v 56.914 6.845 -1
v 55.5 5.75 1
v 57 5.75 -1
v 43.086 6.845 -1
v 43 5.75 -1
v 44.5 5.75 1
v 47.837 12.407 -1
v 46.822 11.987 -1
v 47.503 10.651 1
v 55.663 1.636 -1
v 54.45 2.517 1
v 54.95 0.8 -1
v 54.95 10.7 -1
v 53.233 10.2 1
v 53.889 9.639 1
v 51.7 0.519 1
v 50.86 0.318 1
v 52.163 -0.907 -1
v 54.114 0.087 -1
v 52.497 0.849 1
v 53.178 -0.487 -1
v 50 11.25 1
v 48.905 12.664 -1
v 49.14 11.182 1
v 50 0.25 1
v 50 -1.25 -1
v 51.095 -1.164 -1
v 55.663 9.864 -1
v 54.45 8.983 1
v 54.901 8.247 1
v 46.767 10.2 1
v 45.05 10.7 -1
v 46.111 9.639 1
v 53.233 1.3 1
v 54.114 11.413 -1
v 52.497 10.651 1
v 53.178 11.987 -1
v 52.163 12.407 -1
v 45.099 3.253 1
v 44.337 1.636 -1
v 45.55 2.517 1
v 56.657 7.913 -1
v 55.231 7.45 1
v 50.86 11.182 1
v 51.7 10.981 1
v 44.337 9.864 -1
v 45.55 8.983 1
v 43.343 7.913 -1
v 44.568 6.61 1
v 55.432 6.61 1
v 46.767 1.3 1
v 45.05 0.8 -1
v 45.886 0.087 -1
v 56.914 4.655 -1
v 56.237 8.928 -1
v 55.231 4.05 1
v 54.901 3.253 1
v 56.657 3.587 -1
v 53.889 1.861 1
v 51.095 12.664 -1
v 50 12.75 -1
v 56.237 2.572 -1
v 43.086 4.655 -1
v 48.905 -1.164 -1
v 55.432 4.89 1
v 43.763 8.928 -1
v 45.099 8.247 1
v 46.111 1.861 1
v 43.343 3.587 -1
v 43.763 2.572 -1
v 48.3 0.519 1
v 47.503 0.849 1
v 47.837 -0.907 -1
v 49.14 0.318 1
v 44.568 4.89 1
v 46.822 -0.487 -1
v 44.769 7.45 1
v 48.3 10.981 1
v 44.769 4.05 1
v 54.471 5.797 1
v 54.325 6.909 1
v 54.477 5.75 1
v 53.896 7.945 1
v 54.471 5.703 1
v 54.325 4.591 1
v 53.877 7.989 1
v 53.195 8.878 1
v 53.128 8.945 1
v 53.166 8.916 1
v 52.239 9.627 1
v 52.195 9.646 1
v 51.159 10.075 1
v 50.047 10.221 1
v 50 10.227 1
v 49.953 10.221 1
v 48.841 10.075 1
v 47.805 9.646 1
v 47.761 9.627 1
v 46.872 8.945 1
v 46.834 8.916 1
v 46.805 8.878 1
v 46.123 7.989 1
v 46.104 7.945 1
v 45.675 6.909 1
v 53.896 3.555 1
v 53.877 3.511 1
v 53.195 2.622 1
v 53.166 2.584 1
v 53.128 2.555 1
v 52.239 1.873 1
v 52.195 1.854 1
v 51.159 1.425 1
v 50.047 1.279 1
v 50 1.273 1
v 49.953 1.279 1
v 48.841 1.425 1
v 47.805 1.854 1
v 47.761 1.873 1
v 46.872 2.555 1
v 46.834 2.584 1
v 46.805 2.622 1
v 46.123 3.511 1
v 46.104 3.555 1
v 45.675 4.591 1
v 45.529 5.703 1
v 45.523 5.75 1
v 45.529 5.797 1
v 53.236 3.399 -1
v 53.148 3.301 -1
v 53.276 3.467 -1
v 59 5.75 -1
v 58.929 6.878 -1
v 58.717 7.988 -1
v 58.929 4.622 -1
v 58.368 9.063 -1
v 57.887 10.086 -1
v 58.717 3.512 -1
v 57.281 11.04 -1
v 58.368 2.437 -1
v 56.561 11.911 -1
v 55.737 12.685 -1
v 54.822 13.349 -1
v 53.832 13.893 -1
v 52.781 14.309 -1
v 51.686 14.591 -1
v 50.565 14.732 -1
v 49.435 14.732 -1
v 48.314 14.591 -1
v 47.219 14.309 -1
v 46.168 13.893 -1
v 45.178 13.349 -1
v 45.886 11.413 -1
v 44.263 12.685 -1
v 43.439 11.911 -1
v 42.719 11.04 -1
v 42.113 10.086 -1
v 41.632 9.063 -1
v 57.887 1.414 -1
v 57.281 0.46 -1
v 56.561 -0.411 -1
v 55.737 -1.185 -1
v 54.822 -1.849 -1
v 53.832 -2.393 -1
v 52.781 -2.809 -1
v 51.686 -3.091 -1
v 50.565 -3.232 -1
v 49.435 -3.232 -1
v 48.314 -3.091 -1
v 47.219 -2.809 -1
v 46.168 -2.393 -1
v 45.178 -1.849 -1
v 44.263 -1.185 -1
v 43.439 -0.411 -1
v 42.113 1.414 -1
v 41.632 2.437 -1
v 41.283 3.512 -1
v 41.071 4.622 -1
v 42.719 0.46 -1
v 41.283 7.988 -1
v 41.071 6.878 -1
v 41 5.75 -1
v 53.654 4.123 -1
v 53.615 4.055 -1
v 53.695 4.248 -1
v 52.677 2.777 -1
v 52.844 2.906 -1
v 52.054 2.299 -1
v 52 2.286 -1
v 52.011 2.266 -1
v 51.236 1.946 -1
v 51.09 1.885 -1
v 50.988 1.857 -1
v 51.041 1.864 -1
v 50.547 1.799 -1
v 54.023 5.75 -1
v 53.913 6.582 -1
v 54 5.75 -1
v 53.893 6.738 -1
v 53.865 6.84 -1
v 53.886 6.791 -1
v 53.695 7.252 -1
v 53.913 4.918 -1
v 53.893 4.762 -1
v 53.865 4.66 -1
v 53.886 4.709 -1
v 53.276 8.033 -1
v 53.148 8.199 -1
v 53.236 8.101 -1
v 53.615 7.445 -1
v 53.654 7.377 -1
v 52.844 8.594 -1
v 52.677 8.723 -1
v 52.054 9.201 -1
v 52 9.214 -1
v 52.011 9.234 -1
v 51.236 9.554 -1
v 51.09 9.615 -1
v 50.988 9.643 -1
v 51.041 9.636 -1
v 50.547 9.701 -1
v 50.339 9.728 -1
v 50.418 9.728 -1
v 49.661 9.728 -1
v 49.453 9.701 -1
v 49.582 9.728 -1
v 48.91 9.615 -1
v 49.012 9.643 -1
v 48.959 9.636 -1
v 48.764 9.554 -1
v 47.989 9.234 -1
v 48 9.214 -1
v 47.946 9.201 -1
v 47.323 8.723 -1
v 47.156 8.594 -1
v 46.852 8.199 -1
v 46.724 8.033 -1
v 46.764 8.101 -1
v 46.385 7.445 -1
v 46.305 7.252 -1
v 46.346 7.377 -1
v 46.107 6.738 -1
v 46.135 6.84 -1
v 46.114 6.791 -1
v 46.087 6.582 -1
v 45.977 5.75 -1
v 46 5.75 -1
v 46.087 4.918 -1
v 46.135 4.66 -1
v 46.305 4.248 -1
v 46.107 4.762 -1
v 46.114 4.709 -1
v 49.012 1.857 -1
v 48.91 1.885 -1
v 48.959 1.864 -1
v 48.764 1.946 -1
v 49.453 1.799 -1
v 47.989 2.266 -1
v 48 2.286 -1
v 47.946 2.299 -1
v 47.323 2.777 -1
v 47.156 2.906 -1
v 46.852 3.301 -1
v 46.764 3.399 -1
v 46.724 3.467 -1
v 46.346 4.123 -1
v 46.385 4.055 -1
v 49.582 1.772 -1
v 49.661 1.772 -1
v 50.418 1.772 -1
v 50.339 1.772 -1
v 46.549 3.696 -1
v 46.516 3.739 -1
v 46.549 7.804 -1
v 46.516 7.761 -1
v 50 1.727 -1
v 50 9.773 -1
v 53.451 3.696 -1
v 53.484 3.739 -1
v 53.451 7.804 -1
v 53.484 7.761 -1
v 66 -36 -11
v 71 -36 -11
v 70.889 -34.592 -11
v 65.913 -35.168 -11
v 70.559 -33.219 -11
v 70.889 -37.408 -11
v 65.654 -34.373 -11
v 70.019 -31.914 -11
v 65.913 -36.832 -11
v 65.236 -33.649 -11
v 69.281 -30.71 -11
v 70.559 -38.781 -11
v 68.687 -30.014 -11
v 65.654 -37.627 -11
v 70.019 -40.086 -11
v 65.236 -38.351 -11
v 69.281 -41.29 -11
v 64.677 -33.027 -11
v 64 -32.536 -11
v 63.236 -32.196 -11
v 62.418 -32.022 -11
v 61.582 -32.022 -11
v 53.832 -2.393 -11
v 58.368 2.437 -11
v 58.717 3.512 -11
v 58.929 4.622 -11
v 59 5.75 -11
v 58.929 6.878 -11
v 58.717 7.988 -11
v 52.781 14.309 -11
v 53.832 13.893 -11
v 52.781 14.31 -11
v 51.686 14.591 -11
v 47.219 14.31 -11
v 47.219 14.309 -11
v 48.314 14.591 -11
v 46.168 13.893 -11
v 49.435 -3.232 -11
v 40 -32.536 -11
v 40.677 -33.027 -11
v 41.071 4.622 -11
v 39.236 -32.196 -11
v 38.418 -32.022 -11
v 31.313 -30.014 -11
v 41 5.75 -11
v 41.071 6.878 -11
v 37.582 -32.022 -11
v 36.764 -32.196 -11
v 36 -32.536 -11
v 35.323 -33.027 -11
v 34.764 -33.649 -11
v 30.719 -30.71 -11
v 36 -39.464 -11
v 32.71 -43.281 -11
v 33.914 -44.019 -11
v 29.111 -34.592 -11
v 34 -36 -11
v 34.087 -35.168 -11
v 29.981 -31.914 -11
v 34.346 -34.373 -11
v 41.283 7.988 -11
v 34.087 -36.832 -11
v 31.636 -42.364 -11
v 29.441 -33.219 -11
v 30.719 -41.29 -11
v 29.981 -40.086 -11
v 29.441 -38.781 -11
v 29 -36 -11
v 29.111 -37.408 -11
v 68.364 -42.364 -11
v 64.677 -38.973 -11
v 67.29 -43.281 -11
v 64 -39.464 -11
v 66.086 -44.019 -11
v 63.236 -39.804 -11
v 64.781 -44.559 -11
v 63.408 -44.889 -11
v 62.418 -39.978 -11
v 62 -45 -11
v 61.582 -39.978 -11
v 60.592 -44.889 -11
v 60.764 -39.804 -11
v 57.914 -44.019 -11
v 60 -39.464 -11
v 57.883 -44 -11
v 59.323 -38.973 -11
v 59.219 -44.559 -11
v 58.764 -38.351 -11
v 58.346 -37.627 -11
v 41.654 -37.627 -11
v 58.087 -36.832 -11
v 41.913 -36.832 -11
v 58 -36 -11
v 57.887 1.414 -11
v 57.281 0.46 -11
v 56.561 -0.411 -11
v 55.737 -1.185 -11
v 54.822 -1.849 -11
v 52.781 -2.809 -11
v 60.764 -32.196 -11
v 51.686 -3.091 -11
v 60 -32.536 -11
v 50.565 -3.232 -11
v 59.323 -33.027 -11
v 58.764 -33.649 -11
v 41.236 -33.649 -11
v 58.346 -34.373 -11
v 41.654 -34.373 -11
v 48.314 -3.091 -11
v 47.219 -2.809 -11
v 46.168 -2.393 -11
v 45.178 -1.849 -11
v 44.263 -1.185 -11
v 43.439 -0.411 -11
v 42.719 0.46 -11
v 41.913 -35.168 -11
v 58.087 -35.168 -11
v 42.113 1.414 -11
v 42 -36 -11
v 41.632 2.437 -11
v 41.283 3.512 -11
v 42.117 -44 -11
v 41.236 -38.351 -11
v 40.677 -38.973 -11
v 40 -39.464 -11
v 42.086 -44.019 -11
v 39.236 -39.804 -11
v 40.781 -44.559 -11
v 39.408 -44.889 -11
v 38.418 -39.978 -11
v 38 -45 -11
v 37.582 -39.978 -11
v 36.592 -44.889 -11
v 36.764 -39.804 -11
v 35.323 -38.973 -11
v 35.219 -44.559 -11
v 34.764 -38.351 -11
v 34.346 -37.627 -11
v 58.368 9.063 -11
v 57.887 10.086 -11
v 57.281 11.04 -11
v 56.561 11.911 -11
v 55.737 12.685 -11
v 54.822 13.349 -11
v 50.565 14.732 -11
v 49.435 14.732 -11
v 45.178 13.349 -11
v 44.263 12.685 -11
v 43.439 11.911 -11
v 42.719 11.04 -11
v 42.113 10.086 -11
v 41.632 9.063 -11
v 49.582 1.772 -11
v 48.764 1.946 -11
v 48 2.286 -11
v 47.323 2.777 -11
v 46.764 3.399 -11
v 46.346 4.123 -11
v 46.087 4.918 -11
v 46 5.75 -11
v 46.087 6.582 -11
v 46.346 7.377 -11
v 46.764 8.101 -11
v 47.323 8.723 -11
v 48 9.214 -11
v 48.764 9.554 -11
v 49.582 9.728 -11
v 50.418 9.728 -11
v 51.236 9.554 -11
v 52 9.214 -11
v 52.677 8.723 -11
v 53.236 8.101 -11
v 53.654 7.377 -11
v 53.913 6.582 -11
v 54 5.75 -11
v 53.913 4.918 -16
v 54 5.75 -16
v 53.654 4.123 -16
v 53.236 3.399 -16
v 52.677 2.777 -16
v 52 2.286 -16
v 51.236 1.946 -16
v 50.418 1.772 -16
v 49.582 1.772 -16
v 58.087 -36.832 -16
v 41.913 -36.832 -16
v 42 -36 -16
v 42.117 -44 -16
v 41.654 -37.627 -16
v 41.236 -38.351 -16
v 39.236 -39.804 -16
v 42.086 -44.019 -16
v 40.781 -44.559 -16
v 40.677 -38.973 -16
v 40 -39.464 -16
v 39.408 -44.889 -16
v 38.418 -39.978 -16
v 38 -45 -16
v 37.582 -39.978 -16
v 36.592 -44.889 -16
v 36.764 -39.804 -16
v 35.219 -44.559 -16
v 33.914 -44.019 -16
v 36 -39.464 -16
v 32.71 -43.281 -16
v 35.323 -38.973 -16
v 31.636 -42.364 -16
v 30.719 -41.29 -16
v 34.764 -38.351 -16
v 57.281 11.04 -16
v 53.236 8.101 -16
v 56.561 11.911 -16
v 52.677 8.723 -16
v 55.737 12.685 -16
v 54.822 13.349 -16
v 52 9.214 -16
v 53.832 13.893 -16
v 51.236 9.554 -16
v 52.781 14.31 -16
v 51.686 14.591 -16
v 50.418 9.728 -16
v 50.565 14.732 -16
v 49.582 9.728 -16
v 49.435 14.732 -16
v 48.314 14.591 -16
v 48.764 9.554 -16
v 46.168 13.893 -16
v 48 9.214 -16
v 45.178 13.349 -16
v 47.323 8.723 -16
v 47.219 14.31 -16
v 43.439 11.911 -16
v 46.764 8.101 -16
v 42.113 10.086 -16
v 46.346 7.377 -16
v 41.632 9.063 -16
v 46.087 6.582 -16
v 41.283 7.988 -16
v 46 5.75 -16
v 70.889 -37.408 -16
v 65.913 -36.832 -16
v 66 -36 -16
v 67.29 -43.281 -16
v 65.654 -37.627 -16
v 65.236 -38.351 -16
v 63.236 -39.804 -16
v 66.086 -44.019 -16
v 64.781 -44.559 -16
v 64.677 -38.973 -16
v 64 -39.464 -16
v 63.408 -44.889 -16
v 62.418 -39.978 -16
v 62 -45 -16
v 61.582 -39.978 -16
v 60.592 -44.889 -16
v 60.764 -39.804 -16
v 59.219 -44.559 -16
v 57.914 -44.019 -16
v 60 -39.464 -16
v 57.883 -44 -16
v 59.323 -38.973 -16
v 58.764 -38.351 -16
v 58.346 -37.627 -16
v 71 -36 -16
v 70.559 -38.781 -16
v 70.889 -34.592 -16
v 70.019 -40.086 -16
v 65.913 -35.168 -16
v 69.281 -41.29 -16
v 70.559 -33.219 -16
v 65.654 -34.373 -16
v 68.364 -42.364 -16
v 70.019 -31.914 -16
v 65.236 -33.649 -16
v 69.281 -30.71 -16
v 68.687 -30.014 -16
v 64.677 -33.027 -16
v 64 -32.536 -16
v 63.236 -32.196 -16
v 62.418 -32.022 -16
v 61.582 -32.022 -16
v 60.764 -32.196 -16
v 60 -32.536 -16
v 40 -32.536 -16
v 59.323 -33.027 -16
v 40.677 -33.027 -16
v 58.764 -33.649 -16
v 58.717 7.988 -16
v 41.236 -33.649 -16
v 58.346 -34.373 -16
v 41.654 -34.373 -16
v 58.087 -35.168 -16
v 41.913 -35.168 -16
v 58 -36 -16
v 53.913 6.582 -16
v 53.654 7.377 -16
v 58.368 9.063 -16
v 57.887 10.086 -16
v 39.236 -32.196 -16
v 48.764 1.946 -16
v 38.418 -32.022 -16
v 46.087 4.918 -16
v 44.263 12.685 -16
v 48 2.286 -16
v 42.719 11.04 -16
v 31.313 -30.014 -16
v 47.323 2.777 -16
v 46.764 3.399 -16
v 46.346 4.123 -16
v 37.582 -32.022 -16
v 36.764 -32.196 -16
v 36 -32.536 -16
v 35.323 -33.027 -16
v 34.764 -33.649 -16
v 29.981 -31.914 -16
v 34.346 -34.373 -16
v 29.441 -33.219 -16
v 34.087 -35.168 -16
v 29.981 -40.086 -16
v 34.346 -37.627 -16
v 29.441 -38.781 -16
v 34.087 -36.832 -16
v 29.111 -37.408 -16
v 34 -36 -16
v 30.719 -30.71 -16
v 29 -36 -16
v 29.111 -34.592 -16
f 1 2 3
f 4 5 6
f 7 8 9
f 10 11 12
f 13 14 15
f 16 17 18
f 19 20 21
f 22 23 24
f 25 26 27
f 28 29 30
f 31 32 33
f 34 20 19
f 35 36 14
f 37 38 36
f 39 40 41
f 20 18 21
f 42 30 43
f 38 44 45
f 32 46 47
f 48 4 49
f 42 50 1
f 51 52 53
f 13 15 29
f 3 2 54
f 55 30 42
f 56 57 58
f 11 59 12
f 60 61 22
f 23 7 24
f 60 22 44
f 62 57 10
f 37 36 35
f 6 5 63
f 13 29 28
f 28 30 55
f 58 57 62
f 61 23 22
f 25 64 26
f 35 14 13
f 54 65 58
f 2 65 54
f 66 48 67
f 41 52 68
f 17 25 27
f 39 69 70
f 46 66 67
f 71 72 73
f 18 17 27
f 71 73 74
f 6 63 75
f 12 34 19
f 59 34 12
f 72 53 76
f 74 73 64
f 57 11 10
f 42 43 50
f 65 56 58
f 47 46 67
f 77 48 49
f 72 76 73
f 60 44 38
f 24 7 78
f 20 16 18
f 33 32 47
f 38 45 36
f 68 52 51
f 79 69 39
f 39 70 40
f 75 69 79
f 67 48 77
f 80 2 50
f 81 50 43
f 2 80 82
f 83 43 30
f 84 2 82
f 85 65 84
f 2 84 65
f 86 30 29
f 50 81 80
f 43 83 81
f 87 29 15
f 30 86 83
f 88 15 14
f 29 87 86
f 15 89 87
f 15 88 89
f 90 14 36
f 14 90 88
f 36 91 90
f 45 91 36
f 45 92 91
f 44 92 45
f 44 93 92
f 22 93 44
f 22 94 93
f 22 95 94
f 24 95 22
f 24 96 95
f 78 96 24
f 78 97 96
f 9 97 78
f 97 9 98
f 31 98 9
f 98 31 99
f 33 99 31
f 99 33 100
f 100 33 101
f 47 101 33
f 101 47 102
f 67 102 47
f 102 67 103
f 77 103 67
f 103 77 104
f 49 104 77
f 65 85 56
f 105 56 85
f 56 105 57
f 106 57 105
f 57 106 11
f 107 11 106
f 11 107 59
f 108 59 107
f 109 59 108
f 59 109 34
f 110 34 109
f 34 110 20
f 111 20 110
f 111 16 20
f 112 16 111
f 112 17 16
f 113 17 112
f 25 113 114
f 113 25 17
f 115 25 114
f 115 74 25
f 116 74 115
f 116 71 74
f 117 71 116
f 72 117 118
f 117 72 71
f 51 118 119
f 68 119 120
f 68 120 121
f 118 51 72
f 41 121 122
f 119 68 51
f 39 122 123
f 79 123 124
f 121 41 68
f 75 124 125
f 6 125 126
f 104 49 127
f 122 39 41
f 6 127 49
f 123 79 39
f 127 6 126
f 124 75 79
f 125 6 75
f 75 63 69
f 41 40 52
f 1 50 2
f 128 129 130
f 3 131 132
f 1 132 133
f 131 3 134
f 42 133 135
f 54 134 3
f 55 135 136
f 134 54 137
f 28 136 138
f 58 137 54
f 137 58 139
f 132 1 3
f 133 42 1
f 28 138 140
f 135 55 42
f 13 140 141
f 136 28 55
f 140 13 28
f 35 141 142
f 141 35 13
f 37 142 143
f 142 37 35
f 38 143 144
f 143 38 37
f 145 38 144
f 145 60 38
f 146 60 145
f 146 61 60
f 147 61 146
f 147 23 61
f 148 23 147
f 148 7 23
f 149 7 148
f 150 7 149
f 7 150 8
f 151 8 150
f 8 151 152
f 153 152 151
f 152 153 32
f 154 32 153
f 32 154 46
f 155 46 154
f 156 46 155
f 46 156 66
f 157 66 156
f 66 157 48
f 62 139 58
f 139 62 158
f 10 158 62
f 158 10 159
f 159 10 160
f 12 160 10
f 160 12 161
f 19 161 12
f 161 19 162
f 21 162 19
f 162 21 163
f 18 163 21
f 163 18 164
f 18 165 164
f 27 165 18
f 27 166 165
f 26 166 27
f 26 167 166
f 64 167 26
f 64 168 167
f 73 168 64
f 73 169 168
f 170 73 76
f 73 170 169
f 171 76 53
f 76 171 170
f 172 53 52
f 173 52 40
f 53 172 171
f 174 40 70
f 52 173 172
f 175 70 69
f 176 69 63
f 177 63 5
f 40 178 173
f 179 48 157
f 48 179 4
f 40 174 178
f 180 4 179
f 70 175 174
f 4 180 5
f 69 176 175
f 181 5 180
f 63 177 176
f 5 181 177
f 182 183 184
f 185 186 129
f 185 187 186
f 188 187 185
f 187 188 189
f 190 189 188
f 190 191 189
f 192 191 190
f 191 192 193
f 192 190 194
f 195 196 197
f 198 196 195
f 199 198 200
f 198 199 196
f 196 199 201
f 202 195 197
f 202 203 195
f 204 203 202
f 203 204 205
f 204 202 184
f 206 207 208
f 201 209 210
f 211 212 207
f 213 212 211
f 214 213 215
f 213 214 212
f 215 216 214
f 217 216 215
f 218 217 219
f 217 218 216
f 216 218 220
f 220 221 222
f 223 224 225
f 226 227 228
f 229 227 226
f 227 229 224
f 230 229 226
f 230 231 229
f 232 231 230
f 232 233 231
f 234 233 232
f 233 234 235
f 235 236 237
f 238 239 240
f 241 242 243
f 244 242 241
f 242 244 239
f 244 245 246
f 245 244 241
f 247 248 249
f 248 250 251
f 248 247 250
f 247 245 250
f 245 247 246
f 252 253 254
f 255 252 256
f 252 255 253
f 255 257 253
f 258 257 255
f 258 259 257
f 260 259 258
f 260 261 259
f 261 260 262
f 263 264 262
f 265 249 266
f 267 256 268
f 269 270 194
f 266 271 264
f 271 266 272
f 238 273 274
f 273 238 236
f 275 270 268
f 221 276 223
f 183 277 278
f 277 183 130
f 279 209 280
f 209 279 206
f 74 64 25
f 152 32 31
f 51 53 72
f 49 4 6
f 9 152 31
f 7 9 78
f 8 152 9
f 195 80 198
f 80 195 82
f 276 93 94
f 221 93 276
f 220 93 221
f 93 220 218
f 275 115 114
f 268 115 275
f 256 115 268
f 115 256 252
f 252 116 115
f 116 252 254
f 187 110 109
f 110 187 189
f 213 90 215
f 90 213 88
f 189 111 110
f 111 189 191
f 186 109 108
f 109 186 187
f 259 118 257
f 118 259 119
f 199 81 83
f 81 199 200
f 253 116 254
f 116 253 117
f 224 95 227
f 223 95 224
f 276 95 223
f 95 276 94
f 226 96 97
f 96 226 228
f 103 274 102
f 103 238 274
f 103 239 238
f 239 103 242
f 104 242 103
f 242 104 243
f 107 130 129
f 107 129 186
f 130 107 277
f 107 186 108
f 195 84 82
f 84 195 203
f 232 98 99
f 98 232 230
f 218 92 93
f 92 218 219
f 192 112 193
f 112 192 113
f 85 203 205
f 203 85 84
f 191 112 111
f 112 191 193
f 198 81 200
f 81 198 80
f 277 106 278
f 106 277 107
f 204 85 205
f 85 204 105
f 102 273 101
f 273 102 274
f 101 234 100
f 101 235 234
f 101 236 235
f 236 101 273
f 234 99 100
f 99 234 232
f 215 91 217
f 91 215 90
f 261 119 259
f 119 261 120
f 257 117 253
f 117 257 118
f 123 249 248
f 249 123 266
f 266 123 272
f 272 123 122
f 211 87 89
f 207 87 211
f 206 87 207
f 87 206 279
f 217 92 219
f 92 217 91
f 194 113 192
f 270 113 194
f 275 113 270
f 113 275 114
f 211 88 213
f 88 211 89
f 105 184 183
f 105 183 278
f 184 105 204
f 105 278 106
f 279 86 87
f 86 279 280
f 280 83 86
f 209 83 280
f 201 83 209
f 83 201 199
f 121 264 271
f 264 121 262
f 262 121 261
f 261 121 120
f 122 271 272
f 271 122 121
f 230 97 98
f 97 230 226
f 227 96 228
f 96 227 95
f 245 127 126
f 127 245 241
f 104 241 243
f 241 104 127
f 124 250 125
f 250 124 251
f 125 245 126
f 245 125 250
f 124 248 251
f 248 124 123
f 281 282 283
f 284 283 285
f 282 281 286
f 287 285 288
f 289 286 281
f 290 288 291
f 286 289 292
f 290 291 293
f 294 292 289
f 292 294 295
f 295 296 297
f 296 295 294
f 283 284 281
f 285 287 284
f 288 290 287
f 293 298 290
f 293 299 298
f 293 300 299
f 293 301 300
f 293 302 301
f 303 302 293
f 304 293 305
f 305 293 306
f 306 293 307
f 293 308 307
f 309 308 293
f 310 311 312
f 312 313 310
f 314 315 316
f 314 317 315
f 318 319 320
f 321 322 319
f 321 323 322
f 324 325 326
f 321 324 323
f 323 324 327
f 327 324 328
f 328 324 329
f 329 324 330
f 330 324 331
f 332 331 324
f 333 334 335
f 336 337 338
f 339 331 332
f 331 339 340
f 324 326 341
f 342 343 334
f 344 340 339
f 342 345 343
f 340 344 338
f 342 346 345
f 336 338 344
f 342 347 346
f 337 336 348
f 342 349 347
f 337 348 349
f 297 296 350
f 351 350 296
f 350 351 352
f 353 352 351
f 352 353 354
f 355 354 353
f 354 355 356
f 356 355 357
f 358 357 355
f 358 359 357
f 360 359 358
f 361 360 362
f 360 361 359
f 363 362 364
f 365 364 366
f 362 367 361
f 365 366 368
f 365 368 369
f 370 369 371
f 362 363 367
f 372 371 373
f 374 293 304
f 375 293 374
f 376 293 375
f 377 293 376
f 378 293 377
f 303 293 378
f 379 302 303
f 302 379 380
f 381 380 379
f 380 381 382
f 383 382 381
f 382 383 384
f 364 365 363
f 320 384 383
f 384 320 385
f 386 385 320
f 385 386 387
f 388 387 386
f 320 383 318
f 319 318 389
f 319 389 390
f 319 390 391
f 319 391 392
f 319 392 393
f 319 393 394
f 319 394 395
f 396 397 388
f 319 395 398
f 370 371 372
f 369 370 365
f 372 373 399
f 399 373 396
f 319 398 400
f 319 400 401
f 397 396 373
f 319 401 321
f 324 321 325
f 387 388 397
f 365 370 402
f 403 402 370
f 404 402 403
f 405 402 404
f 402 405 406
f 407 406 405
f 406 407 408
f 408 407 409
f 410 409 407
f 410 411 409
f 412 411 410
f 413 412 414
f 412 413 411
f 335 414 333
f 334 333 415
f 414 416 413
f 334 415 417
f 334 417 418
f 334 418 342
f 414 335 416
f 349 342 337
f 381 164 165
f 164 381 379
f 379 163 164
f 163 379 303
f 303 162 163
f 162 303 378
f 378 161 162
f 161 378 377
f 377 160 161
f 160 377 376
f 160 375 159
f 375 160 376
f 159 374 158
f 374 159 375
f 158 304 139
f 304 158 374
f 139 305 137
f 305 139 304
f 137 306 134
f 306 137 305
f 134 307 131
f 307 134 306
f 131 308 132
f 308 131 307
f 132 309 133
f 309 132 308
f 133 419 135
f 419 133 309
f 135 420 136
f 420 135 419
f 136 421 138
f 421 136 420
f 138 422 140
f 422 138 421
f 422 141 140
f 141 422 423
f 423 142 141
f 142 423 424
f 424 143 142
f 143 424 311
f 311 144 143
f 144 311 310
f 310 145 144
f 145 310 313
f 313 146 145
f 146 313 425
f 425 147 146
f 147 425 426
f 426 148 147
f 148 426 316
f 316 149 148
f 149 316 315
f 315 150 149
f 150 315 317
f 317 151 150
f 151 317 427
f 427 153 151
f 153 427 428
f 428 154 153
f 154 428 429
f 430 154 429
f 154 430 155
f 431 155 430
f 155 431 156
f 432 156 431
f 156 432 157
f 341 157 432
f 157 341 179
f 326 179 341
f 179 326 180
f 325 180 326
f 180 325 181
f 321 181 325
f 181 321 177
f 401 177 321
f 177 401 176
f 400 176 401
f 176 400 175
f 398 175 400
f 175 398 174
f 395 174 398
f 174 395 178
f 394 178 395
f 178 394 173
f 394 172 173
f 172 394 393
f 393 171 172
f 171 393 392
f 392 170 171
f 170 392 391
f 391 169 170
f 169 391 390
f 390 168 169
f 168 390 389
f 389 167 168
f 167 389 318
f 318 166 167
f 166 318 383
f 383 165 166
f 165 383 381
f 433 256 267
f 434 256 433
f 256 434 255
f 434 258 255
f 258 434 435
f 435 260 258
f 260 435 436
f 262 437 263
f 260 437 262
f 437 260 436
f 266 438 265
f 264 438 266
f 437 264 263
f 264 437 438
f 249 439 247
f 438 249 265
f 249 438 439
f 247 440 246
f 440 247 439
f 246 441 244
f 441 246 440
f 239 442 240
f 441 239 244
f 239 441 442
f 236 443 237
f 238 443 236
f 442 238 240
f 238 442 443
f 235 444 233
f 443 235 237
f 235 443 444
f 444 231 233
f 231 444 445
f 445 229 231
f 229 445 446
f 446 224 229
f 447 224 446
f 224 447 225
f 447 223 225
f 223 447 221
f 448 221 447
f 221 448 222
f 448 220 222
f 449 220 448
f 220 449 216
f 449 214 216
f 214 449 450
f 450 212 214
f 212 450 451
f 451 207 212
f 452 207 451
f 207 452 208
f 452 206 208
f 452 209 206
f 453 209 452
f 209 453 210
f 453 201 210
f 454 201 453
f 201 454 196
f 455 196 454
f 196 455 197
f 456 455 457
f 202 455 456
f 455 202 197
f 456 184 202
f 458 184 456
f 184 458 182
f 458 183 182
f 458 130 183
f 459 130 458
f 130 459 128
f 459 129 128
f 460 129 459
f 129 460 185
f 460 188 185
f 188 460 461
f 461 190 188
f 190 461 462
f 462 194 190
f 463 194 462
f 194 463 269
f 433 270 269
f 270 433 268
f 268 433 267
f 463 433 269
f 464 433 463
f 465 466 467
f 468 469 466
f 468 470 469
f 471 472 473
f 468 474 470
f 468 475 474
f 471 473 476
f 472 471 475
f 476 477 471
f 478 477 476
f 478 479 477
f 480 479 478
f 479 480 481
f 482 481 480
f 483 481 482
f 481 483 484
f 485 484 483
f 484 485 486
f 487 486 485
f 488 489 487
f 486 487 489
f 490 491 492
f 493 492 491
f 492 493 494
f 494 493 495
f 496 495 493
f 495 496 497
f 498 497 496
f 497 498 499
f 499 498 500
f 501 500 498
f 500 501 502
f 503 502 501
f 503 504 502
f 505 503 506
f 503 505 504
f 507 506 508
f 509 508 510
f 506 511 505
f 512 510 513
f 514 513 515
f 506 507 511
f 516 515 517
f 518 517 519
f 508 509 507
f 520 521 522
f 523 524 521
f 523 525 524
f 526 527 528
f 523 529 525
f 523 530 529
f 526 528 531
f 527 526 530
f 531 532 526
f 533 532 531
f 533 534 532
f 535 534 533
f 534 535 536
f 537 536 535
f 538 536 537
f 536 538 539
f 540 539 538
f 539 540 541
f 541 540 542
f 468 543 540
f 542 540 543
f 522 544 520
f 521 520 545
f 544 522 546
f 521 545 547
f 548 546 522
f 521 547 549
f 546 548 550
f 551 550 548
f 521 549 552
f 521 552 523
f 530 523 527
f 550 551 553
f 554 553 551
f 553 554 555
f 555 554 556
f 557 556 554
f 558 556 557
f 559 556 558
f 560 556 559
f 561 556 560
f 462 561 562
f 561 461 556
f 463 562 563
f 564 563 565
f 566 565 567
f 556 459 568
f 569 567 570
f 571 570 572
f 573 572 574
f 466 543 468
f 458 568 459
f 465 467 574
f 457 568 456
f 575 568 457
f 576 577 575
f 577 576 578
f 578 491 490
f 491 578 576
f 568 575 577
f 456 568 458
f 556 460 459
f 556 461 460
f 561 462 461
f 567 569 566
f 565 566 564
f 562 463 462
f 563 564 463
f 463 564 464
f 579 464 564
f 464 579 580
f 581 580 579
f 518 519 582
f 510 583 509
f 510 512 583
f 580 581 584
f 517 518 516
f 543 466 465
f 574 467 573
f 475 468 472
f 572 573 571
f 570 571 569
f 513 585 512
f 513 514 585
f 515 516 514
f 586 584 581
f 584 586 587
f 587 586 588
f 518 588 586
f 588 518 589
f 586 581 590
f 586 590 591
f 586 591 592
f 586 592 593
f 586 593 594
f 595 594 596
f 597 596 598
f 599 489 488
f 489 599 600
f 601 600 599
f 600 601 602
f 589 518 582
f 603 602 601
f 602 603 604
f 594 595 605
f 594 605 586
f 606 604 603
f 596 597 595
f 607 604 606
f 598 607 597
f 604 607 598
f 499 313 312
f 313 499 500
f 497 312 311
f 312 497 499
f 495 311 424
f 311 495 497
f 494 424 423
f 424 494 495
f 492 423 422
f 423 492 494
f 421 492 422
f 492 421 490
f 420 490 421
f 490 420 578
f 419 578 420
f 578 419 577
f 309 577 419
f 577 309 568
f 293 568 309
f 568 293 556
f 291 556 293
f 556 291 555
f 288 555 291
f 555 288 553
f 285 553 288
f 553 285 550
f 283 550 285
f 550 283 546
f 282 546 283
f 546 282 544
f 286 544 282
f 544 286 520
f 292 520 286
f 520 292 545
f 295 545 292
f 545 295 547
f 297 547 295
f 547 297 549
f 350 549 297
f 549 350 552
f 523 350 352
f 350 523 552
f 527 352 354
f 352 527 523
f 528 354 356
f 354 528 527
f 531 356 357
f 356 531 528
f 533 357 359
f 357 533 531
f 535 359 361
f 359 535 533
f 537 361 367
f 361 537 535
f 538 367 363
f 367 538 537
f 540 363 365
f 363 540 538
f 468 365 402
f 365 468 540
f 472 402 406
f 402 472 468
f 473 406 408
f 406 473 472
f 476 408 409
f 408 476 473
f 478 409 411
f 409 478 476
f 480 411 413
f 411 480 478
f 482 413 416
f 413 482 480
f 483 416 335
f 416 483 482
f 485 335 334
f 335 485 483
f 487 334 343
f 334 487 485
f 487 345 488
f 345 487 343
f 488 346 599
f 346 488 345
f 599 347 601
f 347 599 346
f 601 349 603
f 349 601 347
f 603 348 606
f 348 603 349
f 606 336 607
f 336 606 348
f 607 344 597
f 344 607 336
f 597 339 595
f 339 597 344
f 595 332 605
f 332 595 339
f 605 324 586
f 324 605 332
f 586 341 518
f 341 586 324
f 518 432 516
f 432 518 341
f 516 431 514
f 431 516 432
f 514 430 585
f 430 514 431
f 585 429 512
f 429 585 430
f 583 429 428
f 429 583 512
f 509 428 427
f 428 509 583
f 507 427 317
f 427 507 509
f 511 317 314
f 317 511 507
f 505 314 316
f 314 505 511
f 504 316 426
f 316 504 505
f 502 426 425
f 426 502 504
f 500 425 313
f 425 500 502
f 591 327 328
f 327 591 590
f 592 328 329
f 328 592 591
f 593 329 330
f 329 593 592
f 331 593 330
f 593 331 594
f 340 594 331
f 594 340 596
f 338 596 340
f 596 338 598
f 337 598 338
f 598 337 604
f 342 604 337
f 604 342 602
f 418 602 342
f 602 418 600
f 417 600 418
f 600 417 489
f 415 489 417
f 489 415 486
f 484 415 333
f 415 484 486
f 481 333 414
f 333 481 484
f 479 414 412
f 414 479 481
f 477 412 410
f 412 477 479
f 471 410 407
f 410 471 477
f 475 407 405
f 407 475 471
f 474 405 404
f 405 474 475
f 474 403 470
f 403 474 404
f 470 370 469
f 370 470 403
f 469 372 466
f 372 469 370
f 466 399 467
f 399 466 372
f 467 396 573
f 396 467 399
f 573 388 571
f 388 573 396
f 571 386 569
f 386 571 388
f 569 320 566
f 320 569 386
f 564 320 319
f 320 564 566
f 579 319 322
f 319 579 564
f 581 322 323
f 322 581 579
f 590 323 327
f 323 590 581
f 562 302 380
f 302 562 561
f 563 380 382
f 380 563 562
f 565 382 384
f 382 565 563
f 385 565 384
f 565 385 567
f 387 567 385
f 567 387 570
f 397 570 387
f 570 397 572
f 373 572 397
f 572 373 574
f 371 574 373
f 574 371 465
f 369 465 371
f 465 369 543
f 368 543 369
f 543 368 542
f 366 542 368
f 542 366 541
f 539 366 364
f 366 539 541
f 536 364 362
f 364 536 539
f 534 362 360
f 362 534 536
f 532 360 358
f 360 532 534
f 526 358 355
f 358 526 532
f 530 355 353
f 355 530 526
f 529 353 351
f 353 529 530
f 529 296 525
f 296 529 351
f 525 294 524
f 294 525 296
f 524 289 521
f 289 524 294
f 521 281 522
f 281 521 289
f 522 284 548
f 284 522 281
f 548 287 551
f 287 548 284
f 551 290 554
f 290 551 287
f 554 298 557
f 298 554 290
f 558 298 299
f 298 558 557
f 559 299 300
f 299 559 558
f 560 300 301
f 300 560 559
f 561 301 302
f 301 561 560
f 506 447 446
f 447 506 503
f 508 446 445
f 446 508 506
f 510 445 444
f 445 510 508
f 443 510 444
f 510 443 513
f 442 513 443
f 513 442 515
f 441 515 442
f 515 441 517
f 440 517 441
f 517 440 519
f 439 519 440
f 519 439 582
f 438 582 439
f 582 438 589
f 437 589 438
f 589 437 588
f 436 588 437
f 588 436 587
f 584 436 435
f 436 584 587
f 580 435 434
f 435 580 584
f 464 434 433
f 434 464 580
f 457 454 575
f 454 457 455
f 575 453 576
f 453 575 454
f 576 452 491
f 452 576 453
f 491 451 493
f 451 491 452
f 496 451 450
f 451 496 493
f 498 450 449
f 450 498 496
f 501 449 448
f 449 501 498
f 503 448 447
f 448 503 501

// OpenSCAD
//*/
tubesize=20;//25.4;
wide=80;
thick=31;
zoff=8;
c2o=0;
comp=.25;
half=0;
deep=40+tubesize;
translate([-45,20,-tubesize]) tube(2);
translate([-45,40,0]) rotate([0,0,-90]) {
  tube(2);
  translate([130,0]) {
    translate([0,0,-5]) carrier_block(0,1);
    translate([70-tubesize/2,-10,24+tubesize+2]) rotate([0,0,90]) {
      translate([55,-5,20]) {
        rotate([-90,0]) union() {
          carrier_block(0,1);
          rotate([-90,0]) counter();

        }
        
      }
      tube(2);
    }
  }
}
translate([80-10,20,-tubesize-5]) carrier_block(0,1);
translate([120-tubesize/2,50,24]) rotate([0,0,-90]) {
  translate([70,22,0]) {
        rotate([90,0]) carrier_block(0,1);
      }
  tube(2);
}
translate([80-10,20,6]) mirror([0,0,1]) carrier_block(0);
*for(x=[10,60],y=[9,56.4]) translate([x,y,-52]) bolt(3.5);
//*/
//*

module counter() {
  !rotate([90,0]) union() {
    difference() {
      translate([32,-16,-16]) rotate([-90,0]) mirror([0,1]) 
        linear_extrude(5,convexity=3) difference() { union() {
          translate([6,52]) circle(d=18,$fn=40);
          translate([30,52]) circle(d=18,$fn=40);
          hull() {
            //square([36,64]);
            translate([6,52]) circle(d=16,$fn=40);
            translate([30,52]) circle(d=16,$fn=40);
            translate([18,10+comp]) circle(d=18,$fn=50);
          }
        }
      translate([6,52]) circle(d=8,h=10,$fn=30);
      translate([30,52]) circle(d=8,h=10,$fn=30);
      translate([18,10+comp]) circle(d=8,h=10,$fn=30);
      }
    }
    translate([50,-16+5,-6+comp]) rotate([-90,0]) {
      linear_extrude(10) difference() {
        circle(d=18,$fn=50);
        circle(d=8,$fn=30);
      }
      translate([0,0,10]) hump();
      %translate([0,0,12]) bearing();
    }
   }
}
module mpcpc_style() {
xpos=245;
ypos=80;
yfeet=3;
xfeet=4;
zup=100;
{
  translate([0,0,zup-48]) tube(xfeet);
  translate([25.4,0,-25.4]) rotate([0,0,90]) tube(yfeet);
  for(x=[xpos]) {
    translate([x,-20,zup]) rotate([0,0,90]) tube(yfeet);
    translate([x-45,0,zup-48]) carrier_block();
  }
  for(y=[ypos]) {
    translate([-20,y,22.6]) {
      tube(xfeet);
      translate([45.4,-20,-47.6]) rotate([0,0,90]) carrier_block();
    }
  }
  
}
}
module cube2(dims,r=7,o=2)
{
  linear_extrude(dims[2],convexity=4) {
    translate([r-o,r-o]) square([dims[0]-r*2+o*2,dims[1]-r*2+o*2]);
    for(x=[r,dims[0]-r],y=[r,dims[1]-r])
      translate([x,y]) rotate([0,0,x>r?(y>r?180:90):(y>r?270:0)]) 
        difference() { hull() {
          circle(r=r,$fn=50);
          translate([10,10]) circle(r=r,$fn=50);
          }
        }
  }
}

module carrier_block(bolts=1,bearings=1) {
  hxpos=wide>45?[wide/2-12,wide/2+12]:[10,wide-10];
  hypos=[-1,tubesize-9]; //[0,15.4];
  vxpos=wide>=60?[10,wide-10]:[wide/2];
  vypos=[-20+comp,2+tubesize-comp];
  *echo(str("diff: ", vypos[1]-vypos[0]));
  intersection() {
    union() {
      translate([10,0]) {
      difference() {
        translate([0,-20,18+zoff]) {
          translate([3,2+comp]) cube2([wide-6,deep-4-comp*2,thick-zoff],o=c2o);
        }
        translate([-.1,-2,17.9]) cube([wide+.2,4+tubesize,10]);
          for(x=hxpos,y=hypos) translate([x,y,35]) {
            rotate([-90,0]) linear_extrude(10) {
              circle(d=25,h=10,$fn=50);
              translate([-12.5,-15]) square([25,30]);
            }
            *translate([-12.5,0,-10]) cube([25,10,10]);
        }
        for(y=vypos,x=vxpos) translate([0,y,18])
          translate([x,9,-.1]) cylinder(d=8,h=thick+.2,$fn=24);
        for(x=hxpos) translate([x,-20.1,36]) rotate([-90,0]) {
          cylinder(d=8,h=66.02,$fn=24);
          cylinder(d=19,h=9.09-c2o+comp,$fn=50);
          translate([0,0,51.11+c2o-comp]) cylinder(d=19,h=8,$fn=50);
        }
        translate([wide/2,deep/2-20]) for(m=[0,1]) mirror([0,m]) translate([0,tubesize/2+6]) cylinder(d=3,h=50,$fn=20);
      }
      for(y=hypos) translate([0,y-7]) mirrory(12) for(x=hxpos) translate([x,7,36]) rotate([-90,0]) hump(1.4);
      for(y=vypos,x=vxpos) translate([x,y+9,18+zoff]) mirror([0,0,1]) hump(2);
    %translate([0,9]) for(y=vypos,x=vxpos) translate([x,y,17]) {
      if(bearings) bearing();
      if(bolts) translate([0,0,0]) bolt(2);
    }
      if(bearings)
      %for(x=hxpos,y=hypos) translate([x,y+1.4,36.4]) rotate([-90,0]) bearing();
      if(bolts)
      %for(x=hxpos) translate([x,-20,36.4]) rotate([-90,0]) bolt(2.75);
    }
  }
  if(half) {
    translate([10,tubesize/2,22]) cube([wide,deep/2,thick]);
  }
}
}
/*
//*/
module bolt(inches)
{
  cylinder(d=25.4*(5/16),h=inches*25.4,$fn=36);
  translate([0,0,-5]) cylinder(d=13,h=5,$fn=6);
}
module tube(feet=1)
{
  color(tubesize==25.4?"black":"silver") 
    if(tubesize==20)
    {
      translate([0,tubesize/2,tubesize/2]) rotate([0,90]) linear_extrude(feet*12*25.4) ex_face(tubesize,5);
    } else {
      difference() {
      cube([feet*12*25.4,tubesize,tubesize]);
      if(tubesize==25.4) translate([-.1,2,2]) cube([feet*12*25.4+.2,21.4,21.4]);
      }
  }
}
module hump(h=2) {
  difference() {
    cylinder(d1=14,d2=11,h=h,$fn=40);
    translate([0,0,-.1]) cylinder(d1=8,d2=9,h=h+.2,$fn=24);
  }
}
module bearing() {
linear_extrude(7) difference() {
  circle(d=22,h=7,$fn=40);
  circle(d=8,$fn=24);
}
}
module mirrorz(offset=0)
{
  translate([0,0,offset]) for(m=[0,1]) mirror([0,0,m]) translate([0,0,offset*-1]) children();
}
module mirrory(offset=0)
{
  translate([0,offset,0]) for(m=[0,1]) mirror([0,m,0]) translate([0,offset*-1,0]) children();
}
module mirrorx(offset=0)
{
  translate([offset,0]) for(m=[0,1]) mirror([m,0]) translate([offset*-1,0]) children();
}

module ex_face(size=30,type=6,r=2,sides=4)
{
  hole1s=(type==6?6.8:(type==5?4.2:(type==8?10.5:type)));
  hole2s=(type==6?3:type==8?6:5);
  difference(){
    translate([size*-.5+r,size*-.5+r]) minkowski(){
      square(size-r*2);
      circle(r=r,$fn=20);
    }
    if(type>5) for(r=[0:90:359]) rotate([0,0,r]) translate([size*.5-hole2s/2-2,size*.5-hole2s/2-2]) circle(d=hole2s,$fn=30);
    circle(d=hole1s,$fn=30);
    for(rot=sides==4?[]:(sides==3?[0]:(sides==2?[0,2]:[0]))) rotate([0,0,rot*90]) {
      if(type==8)
        translate([-15,-18]) square([30,hole2s]);
    }
    difference() {
      for(rot=[0:3]) rotate([0,0,rot*90]) {
   //translate([size*-.5+3.4,size*-.5+3.4]) circle(d=2,$fn=16);
       if(type==6)
        polygon([[-4,-15],[-4,-13],[-8.25,-13],[-8.25,-10],[-4.25,-6],[4.25,-6],[8.25,-10],[8.25,-13],[4,-13],[4,-15.01]]);
       else if(type==8)
         polygon([[-5,-20],[-5,-14.5],[-10,-14.5],[-10,-12],[-5.5,-7.5],[5.5,-7.5],[10,-12],[10,-14.5],[5,-14.5],[5,-20]]);
       else
         polygon([[-3,size*-.5],[-3,size*-.5+2],[-6,size*-.5+2],[-6,size*-.5+3],[-2,size*-.5+6],[2,size*-.5+6],[6,size*-.5+3],[6,size*-.5+2],[3,size*-.5+2],[3,size*-.5]]);
     }
 for(rot=sides==4?[]:(sides==3?[0]:(sides==2?[0,2]:[0]))) rotate([0,0,rot*90]) {
   if(type==8)
       translate([-5,-20]) square([10,5.5]);
   }
    }
  }
}
